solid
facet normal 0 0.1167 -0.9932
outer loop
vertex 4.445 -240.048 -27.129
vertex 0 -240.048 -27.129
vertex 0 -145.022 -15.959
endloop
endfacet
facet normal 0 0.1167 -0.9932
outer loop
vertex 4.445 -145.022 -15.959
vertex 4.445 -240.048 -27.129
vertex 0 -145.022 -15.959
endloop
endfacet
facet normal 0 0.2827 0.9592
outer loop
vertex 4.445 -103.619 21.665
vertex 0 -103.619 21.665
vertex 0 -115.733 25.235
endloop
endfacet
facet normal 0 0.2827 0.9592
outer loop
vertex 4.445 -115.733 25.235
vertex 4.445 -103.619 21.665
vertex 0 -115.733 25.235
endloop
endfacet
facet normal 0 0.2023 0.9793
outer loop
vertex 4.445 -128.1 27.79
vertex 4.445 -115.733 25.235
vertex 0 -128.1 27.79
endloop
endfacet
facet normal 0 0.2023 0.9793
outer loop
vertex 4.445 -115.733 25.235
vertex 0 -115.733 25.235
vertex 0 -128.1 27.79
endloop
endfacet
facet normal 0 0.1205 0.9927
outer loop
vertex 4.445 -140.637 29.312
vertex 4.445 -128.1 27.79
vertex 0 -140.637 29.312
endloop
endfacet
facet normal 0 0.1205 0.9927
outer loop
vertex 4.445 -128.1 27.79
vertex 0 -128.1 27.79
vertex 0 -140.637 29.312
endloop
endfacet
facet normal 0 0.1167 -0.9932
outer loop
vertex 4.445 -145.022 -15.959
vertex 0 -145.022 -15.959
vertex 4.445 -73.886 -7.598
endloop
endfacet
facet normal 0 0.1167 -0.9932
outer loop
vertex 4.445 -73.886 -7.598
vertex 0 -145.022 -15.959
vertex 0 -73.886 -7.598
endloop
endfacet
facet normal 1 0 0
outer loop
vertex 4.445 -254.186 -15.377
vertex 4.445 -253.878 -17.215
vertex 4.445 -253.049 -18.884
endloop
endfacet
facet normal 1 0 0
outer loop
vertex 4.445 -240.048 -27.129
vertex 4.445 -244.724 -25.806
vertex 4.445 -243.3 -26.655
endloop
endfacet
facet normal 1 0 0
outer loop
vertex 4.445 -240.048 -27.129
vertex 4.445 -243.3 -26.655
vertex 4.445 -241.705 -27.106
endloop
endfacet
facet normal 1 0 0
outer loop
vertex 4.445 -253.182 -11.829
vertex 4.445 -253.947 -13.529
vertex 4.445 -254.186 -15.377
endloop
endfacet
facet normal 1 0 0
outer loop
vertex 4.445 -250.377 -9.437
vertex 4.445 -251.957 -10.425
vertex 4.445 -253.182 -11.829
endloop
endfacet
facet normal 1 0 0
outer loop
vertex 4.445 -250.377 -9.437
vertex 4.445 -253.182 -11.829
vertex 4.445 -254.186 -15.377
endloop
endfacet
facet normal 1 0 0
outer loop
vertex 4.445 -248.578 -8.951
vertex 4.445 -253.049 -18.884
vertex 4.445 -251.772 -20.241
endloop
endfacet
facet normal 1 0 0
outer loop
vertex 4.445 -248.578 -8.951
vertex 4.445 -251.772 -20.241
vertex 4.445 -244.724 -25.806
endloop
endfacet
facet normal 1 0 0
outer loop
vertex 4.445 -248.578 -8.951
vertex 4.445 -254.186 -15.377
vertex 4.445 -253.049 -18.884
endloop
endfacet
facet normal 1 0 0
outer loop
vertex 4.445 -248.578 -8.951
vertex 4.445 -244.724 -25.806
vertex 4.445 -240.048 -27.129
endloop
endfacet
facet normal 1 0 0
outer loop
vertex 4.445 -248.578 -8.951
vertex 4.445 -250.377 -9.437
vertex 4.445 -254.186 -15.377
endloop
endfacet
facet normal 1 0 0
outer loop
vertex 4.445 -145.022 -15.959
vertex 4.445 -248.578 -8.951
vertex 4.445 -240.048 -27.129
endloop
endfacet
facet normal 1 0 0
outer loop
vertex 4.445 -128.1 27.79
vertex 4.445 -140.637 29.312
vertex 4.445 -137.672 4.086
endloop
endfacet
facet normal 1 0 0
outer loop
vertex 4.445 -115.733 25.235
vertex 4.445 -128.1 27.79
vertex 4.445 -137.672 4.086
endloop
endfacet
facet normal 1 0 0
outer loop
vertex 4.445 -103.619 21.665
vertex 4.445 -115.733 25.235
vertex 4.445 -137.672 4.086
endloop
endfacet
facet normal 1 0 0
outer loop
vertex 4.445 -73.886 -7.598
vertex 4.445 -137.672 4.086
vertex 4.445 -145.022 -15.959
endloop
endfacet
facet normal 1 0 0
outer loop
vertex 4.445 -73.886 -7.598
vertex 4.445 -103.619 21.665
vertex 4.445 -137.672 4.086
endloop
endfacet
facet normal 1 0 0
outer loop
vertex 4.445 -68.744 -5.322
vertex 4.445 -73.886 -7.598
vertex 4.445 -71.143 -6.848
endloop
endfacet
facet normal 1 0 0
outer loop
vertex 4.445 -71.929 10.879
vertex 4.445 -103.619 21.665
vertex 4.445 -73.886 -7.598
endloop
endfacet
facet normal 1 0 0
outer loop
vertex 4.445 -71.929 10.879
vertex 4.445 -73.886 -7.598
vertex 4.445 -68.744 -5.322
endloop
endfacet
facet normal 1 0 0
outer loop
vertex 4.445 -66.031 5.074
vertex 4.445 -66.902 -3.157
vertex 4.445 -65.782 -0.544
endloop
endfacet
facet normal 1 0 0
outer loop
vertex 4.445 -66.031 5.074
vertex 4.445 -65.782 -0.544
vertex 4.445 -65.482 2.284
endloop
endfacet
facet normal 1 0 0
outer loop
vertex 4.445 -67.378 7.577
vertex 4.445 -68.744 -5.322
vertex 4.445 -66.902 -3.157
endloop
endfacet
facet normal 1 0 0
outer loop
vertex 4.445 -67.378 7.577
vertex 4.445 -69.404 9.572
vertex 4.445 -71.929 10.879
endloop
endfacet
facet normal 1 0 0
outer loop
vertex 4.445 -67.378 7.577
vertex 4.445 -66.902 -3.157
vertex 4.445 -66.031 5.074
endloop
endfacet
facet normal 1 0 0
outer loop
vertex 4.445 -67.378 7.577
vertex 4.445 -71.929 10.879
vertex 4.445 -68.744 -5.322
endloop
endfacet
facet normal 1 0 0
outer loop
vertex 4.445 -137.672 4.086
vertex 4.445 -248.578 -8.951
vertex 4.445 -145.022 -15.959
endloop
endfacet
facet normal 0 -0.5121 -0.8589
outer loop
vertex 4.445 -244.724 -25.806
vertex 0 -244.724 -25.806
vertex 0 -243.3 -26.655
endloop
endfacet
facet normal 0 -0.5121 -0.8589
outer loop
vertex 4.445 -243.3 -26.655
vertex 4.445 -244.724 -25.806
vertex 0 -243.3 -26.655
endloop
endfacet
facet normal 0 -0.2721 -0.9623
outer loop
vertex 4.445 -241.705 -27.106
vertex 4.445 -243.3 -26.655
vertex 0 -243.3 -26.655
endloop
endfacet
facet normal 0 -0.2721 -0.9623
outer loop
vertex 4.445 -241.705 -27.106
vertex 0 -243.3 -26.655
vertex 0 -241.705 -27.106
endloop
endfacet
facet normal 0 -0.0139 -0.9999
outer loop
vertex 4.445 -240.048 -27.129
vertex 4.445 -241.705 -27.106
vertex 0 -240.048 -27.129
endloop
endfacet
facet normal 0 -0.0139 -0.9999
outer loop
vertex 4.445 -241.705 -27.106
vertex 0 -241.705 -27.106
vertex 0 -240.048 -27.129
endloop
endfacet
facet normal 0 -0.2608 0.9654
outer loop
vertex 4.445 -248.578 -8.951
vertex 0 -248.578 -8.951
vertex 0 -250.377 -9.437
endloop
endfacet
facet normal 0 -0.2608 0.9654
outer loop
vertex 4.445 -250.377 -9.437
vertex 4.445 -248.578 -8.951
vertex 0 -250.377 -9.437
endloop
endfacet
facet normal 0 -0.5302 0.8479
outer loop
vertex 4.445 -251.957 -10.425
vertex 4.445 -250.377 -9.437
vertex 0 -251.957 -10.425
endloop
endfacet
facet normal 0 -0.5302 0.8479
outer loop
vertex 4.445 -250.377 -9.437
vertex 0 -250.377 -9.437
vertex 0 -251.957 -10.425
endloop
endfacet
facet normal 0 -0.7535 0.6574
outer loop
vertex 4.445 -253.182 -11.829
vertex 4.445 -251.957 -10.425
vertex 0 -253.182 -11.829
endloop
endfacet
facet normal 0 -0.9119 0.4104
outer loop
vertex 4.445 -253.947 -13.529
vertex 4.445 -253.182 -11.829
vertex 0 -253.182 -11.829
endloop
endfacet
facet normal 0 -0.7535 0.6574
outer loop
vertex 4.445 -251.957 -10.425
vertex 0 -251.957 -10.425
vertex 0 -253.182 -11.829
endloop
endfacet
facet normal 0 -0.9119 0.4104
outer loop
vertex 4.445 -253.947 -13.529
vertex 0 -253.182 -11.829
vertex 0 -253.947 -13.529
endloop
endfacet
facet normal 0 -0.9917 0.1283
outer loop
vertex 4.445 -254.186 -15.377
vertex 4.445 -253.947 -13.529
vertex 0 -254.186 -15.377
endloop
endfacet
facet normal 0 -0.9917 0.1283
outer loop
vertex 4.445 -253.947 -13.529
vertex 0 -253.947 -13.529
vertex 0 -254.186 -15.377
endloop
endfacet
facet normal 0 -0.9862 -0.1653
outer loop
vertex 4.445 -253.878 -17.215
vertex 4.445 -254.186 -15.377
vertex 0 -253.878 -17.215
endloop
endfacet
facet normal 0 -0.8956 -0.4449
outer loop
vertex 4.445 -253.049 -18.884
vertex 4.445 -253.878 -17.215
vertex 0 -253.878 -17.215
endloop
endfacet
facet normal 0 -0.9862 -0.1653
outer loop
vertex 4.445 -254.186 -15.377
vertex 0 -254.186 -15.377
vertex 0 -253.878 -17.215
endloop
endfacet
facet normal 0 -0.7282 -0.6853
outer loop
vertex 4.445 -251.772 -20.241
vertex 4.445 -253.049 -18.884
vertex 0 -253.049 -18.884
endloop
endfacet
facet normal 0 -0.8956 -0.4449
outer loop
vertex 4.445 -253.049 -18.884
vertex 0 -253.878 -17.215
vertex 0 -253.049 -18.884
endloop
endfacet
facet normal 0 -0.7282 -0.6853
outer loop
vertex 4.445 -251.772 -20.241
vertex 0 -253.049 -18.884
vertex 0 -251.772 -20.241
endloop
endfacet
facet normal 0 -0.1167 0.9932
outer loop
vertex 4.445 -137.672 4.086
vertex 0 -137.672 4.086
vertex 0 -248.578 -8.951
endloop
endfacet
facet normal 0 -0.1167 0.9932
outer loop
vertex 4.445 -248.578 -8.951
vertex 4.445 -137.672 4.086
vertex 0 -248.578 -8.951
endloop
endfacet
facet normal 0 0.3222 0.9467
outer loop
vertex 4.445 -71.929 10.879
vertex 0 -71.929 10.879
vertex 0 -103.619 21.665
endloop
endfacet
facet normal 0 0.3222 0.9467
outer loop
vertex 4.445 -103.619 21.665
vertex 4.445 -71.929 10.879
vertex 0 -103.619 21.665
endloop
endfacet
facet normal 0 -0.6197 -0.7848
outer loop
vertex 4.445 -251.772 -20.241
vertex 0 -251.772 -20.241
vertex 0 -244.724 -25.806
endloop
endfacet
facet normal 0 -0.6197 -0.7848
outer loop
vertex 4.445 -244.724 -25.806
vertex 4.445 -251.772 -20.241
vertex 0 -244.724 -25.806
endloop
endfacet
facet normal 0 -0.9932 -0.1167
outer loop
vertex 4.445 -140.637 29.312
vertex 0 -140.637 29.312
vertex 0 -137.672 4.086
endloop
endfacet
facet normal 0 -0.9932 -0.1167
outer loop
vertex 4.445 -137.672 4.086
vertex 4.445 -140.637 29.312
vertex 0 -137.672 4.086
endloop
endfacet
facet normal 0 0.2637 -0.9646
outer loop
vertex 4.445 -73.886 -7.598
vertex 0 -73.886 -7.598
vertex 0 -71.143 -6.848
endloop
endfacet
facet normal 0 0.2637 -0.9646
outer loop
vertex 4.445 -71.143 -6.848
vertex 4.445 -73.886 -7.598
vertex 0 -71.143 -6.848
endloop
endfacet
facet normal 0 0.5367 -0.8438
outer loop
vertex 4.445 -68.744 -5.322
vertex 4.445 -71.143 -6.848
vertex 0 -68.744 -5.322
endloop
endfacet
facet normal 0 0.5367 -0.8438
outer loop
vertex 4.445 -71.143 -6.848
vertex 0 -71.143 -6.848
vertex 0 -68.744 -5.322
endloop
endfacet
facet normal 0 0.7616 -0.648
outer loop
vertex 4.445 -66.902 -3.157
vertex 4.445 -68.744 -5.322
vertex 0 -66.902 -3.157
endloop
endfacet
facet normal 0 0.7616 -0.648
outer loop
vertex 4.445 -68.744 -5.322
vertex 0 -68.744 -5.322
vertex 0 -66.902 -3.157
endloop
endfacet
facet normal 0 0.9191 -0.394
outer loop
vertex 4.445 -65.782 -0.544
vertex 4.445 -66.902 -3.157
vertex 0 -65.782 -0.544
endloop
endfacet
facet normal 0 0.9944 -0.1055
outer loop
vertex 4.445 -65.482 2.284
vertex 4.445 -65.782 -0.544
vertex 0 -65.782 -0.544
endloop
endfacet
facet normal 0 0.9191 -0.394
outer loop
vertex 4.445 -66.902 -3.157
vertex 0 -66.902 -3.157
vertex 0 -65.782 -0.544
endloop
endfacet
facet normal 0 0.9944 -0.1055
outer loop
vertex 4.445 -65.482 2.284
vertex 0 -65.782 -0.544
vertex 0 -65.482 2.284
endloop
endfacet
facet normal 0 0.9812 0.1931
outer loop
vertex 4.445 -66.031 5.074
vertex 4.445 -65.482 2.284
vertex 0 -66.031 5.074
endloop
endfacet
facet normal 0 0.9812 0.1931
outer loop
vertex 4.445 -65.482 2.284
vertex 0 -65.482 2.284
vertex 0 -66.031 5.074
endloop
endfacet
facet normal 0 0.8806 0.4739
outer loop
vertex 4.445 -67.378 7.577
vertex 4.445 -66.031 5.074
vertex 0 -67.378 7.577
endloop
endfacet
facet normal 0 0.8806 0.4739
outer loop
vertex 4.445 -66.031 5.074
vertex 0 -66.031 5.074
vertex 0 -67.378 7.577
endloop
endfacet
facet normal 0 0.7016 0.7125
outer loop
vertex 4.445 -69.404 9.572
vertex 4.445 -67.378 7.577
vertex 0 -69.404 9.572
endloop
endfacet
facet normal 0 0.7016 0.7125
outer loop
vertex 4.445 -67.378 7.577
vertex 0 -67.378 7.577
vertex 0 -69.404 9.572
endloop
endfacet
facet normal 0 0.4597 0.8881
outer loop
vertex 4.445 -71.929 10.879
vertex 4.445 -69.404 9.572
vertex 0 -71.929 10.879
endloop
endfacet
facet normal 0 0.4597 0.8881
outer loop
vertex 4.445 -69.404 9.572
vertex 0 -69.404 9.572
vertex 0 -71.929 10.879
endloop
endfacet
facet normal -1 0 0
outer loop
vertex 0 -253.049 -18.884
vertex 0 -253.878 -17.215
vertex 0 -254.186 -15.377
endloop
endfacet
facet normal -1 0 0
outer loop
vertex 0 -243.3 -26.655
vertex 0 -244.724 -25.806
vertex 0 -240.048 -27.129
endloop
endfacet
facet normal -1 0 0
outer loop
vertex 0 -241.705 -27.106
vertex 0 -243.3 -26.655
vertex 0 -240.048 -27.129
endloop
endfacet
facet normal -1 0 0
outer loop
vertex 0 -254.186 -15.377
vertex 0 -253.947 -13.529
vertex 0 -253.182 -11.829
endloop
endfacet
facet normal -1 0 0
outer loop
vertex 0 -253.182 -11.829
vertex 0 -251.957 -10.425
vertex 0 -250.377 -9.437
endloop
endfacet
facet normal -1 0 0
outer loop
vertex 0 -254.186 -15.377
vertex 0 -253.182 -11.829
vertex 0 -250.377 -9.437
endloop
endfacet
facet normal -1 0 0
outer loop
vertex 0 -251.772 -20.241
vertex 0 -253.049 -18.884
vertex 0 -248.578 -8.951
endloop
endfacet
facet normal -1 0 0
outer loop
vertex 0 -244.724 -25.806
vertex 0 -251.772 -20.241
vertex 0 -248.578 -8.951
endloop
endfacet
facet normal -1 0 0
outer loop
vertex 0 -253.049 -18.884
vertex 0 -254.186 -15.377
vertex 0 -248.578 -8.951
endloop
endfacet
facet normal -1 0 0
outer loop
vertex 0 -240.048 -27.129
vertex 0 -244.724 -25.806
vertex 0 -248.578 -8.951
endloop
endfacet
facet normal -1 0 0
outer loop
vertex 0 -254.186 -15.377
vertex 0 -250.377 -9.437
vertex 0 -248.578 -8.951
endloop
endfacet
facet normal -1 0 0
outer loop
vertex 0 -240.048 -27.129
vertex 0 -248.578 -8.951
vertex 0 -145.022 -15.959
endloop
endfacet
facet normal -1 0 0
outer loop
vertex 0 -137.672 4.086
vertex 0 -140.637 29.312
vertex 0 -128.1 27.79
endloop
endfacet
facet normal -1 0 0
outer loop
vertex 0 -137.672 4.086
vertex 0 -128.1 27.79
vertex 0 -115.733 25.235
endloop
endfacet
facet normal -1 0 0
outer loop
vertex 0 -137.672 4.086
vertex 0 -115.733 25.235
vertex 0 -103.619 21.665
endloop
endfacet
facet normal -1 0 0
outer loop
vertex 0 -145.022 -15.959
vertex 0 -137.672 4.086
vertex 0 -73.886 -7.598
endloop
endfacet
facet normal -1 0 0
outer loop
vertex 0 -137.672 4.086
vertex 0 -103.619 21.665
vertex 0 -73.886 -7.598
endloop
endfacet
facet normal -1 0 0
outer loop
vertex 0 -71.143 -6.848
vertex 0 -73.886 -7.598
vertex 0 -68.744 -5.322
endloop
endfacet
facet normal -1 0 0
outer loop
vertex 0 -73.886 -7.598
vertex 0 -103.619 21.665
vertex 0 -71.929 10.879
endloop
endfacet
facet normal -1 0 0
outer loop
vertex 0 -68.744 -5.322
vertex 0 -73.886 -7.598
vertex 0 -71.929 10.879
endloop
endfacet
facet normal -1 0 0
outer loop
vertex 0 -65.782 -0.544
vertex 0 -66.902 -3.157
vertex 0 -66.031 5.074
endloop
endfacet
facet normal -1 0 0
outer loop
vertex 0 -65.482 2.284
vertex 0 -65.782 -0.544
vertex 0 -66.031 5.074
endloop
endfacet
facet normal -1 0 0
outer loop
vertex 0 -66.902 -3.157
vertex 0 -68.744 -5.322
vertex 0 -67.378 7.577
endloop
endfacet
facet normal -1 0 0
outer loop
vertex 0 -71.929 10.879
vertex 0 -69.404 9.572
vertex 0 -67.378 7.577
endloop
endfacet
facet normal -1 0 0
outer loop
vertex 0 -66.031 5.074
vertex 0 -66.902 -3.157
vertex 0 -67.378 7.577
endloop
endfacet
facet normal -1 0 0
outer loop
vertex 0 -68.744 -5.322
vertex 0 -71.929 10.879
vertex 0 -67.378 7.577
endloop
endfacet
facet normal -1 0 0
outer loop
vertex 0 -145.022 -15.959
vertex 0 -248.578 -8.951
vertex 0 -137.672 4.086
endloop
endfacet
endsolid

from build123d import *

# Parameters (mm, degrees)
F1_DEPTH = 4.445


with BuildPart() as f1:
    # F0 (on Right) → F1 (new body)
    with BuildSketch(Plane.YZ):
        with BuildLine():
            Line((-71.929009, 10.879191), (-103.618976, 21.664825))
            ThreePointArc((-103.618976, 21.664825), (-121.890076, 26.640612), (-140.637203, 29.312091))
            Line((-140.637203, 29.312091), (-137.672003, 4.085764))
            Line((-137.672003, 4.085764), (-248.578204, -8.950579))
            ThreePointArc((-248.578204, -8.950579), (-253.947109, -13.528608), (-251.772153, -20.240766))
            Line((-251.772153, -20.240766), (-244.724271, -25.806048))
            ThreePointArc((-244.724271, -25.806048), (-242.517575, -26.932648), (-240.047723, -27.129024))
            Line((-240.047723, -27.129024), (-145.021622, -15.95929))
            Line((-145.021622, -15.95929), (-73.886, -7.597734))
            ThreePointArc((-73.886, -7.597734), (-65.525931, 0.858906), (-71.929009, 10.879191))
        make_face()
    extrude(amount=F1_DEPTH)


solid = f1.part
